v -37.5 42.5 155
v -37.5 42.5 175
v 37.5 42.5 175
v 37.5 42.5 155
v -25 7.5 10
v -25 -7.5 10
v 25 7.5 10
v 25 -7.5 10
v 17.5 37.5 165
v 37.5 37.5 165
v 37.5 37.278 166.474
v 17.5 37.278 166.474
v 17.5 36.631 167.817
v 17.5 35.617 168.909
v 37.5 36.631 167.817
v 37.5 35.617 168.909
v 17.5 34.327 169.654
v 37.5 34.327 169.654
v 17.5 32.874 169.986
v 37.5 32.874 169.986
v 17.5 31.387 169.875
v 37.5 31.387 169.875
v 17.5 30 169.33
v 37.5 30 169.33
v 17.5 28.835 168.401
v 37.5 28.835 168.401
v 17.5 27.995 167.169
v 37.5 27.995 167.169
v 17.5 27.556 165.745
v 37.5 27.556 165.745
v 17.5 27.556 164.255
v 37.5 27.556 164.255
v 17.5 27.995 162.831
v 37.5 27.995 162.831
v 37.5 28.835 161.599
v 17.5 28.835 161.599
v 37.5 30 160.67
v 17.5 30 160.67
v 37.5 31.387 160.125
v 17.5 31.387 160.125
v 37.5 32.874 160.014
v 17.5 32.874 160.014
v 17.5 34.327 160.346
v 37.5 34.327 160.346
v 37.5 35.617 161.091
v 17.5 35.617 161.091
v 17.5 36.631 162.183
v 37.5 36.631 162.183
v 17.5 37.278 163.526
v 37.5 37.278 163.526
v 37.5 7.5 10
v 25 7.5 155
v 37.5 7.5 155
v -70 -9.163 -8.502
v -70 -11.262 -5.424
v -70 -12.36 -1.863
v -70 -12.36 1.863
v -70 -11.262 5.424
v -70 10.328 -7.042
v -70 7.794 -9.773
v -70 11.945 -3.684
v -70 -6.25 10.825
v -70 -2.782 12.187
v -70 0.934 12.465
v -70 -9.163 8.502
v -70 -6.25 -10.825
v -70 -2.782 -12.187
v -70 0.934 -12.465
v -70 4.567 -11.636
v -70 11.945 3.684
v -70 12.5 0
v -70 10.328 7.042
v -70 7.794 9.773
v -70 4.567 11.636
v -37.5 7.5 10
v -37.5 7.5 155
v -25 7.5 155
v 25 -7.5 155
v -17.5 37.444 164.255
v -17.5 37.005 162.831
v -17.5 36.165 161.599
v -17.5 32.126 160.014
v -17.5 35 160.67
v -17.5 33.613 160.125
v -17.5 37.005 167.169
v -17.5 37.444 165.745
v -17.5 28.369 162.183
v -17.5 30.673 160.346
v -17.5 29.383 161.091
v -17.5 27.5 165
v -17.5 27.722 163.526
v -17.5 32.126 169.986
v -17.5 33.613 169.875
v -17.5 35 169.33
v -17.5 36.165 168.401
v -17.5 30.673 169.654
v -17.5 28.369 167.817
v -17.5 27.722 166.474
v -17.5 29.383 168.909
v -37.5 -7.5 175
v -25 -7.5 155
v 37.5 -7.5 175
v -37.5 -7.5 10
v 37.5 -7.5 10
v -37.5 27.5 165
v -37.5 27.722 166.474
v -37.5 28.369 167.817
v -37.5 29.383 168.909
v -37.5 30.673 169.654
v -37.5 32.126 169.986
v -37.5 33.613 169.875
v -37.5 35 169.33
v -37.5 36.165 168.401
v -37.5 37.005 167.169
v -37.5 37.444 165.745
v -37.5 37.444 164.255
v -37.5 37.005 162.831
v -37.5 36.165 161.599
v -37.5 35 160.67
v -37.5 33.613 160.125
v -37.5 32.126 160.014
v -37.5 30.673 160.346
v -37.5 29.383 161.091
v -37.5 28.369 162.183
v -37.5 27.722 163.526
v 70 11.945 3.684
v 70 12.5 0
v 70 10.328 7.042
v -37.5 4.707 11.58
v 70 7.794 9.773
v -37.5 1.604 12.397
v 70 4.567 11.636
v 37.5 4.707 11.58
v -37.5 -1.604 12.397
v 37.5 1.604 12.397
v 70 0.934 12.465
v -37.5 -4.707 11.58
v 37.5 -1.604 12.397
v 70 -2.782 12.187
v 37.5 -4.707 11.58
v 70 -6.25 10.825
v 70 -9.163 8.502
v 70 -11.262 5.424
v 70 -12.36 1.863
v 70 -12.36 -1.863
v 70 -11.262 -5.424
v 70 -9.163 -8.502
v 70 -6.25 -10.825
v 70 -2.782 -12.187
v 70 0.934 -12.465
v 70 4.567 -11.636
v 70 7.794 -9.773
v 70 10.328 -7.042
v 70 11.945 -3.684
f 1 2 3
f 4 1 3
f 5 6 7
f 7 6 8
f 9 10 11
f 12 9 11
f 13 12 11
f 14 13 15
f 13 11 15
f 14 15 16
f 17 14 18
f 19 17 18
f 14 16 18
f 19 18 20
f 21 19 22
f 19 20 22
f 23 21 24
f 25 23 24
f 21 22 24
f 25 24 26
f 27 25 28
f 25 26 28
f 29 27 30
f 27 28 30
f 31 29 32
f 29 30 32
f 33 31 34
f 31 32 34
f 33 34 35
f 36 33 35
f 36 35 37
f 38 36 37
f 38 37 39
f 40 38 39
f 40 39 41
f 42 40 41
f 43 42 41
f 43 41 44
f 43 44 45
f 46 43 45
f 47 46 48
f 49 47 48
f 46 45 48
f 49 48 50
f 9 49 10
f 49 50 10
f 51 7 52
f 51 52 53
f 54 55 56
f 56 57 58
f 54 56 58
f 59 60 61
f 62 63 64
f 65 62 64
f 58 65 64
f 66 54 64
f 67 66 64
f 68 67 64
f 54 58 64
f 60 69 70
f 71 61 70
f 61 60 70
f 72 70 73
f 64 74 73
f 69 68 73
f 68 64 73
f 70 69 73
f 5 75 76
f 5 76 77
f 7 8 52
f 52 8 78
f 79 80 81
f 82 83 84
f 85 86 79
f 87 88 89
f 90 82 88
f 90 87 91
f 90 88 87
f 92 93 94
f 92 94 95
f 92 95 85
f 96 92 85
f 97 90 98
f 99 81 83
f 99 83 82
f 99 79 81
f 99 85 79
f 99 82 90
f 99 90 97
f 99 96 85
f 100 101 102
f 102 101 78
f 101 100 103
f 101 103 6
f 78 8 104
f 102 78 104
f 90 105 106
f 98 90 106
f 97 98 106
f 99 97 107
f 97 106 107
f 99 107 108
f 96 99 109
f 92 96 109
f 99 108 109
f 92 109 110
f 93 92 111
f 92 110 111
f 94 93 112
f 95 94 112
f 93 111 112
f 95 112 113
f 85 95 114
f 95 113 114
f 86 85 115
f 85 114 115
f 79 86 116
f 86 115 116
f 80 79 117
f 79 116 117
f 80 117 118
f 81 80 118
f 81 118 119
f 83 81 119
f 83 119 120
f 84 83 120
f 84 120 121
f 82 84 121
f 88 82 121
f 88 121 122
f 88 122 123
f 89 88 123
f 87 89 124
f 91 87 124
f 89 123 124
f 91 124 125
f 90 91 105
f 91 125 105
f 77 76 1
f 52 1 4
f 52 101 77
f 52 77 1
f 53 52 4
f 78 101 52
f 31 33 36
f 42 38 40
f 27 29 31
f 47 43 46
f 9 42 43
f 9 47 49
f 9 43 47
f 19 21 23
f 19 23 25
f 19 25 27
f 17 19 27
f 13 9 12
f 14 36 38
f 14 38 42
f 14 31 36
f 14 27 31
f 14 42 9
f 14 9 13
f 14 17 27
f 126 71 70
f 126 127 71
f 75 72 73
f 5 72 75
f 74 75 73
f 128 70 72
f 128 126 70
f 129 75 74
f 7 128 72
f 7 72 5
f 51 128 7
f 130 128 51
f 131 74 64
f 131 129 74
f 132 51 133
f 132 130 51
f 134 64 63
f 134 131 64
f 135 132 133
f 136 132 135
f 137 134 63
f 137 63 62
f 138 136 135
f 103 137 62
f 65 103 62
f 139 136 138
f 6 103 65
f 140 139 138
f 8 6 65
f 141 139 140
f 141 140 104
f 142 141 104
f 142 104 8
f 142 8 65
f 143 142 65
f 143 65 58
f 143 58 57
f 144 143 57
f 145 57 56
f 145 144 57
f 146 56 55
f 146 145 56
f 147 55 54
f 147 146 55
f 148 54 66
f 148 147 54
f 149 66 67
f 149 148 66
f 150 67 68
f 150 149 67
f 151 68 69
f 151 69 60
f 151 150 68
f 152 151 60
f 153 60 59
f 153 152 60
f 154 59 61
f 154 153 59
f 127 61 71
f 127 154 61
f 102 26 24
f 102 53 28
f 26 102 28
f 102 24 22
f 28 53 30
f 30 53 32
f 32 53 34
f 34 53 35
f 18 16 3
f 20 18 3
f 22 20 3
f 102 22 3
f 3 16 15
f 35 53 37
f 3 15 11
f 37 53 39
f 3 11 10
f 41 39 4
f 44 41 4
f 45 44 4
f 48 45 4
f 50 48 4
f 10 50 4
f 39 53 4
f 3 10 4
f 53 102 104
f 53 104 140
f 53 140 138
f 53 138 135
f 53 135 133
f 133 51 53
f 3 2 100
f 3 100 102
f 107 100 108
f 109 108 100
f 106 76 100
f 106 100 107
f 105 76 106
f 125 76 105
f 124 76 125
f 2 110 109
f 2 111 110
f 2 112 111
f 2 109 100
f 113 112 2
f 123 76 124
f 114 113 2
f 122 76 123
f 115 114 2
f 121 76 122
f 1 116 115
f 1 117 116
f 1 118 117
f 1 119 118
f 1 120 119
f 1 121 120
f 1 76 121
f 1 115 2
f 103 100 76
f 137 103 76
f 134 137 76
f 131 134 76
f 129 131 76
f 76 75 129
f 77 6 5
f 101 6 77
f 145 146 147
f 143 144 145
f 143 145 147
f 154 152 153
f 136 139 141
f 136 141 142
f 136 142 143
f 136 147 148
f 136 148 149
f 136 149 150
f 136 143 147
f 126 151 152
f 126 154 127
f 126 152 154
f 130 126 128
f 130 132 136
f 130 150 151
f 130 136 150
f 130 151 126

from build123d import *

# Parameters (mm, degrees)
F0_R      = 12.5
F1_DEPTH  = 70
F2_W      = 75
F2_H      = 15
F3_DEPTH  = 175
F4_W      = 25
F4_H      = 145
F5_DEPTH  = 500
F6_W      = 75
F6_H      = 20
F7_DEPTH  = 50
F8_R      = 5
F9_DEPTH  = 20
F10_R     = 5
F11_DEPTH = 20


with BuildPart() as f1:
    # F0 (on Right) → F1 (new body, symmetric)
    with BuildSketch(Plane.YZ):
        Circle(F0_R)
    extrude(amount=F1_DEPTH, both=True)

    # F2 (on Top) → F3 (join)
    with BuildSketch(Plane.XY):
        Rectangle(F2_W, F2_H)
    extrude(amount=F3_DEPTH)

    # F4 (on face) → F5 (cut)
    with BuildSketch(Plane.XZ.offset(7.5)):
        with Locations((-12.5, 82.5)):
            Rectangle(F4_W, F4_H)
        with Locations((12.5, 82.5)):
            Rectangle(F4_W, F4_H)
    extrude(amount=-F5_DEPTH, mode=Mode.SUBTRACT)

    # F6 (on face) → F7 (join)
    with BuildSketch(Plane.XZ.offset(7.5)):
        with Locations((0, 165)):
            Rectangle(F6_W, F6_H)
    extrude(amount=-F7_DEPTH)

    # F8 (on face) → F9 (cut)
    with BuildSketch(Plane(origin=(-37.5, 0, 0), x_dir=(0, -1, 0), z_dir=(-1, 0, 0))):
        with Locations((-32.5, 165)):
            Circle(F8_R)
    extrude(amount=-F9_DEPTH, mode=Mode.SUBTRACT)

    # F10 (on face) → F11 (cut)
    with BuildSketch(Plane.YZ.offset(37.5)):
        with Locations((32.5, 165)):
            Circle(F10_R)
    extrude(amount=-F11_DEPTH, mode=Mode.SUBTRACT)


solid = f1.part
